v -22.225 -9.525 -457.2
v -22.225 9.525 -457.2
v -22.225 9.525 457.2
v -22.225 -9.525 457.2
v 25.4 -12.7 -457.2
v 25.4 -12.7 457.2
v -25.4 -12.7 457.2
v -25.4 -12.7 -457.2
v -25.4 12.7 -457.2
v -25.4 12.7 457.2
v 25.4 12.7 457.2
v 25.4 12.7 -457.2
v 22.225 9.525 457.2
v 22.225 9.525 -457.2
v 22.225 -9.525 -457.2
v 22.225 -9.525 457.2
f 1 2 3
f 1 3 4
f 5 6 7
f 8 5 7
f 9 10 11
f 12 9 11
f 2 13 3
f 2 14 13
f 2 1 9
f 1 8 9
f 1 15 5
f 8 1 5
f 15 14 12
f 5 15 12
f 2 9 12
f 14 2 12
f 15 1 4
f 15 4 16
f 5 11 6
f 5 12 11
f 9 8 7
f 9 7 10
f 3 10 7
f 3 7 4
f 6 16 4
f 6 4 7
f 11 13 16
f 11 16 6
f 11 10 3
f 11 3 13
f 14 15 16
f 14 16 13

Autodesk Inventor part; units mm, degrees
ref_plane "YZ Plane" through (0, 0, 0) normal (1, 0, 0) x (0, 1, 0)
ref_plane "XZ Plane" through (0, 0, 0) normal (0, 1, 0) x (-1, 0, 0)
ref_plane "XY Plane" through (0, 0, 0) normal (0, 0, 1) x (1, 0, 0)
sketch "Sketch1" plane through (0, 0, 0) normal (0, 0, 1) x (1, 0, 0)
  line L0 (-35.56, 0) -> (35.56, 0) projected
  line L1 (0, -17.78) -> (0, 17.78) projected
  line L2 (-25.4, 12.7) -> (25.4, 12.7)
  line L3 (25.4, 12.7) -> (25.4, -12.7)
  line L4 (25.4, -12.7) -> (-25.4, -12.7)
  line L5 (-25.4, -12.7) -> (-25.4, 12.7)
  line L6 (22.225, 9.525) -> (-22.225, 9.525)
  line L7 (-22.225, 9.525) -> (-22.225, -9.525)
  line L8 (-22.225, -9.525) -> (22.225, -9.525)
  line L9 (22.225, -9.525) -> (22.225, 9.525)
  point P0 (0, 0)
  point P1 (-25.4, 0)
  point P2 (0, 12.7)
  dimension "d0" = 25.4
  dimension "d1" = 3.175
  dimension "d7" = 50.8
extrude "Extrusion1" add sketch "Sketch1" along normal mid plane 914.4 contours L5 L2 L1 L6 L7 L0 | L0 L7 L8 L1 L4 L5 | L1 L8 L9 L0 L3 L4 | L2 L3 L0 L9 L6 L1
properties part number "tubing_template_0.125" material "Aluminum-6061"
